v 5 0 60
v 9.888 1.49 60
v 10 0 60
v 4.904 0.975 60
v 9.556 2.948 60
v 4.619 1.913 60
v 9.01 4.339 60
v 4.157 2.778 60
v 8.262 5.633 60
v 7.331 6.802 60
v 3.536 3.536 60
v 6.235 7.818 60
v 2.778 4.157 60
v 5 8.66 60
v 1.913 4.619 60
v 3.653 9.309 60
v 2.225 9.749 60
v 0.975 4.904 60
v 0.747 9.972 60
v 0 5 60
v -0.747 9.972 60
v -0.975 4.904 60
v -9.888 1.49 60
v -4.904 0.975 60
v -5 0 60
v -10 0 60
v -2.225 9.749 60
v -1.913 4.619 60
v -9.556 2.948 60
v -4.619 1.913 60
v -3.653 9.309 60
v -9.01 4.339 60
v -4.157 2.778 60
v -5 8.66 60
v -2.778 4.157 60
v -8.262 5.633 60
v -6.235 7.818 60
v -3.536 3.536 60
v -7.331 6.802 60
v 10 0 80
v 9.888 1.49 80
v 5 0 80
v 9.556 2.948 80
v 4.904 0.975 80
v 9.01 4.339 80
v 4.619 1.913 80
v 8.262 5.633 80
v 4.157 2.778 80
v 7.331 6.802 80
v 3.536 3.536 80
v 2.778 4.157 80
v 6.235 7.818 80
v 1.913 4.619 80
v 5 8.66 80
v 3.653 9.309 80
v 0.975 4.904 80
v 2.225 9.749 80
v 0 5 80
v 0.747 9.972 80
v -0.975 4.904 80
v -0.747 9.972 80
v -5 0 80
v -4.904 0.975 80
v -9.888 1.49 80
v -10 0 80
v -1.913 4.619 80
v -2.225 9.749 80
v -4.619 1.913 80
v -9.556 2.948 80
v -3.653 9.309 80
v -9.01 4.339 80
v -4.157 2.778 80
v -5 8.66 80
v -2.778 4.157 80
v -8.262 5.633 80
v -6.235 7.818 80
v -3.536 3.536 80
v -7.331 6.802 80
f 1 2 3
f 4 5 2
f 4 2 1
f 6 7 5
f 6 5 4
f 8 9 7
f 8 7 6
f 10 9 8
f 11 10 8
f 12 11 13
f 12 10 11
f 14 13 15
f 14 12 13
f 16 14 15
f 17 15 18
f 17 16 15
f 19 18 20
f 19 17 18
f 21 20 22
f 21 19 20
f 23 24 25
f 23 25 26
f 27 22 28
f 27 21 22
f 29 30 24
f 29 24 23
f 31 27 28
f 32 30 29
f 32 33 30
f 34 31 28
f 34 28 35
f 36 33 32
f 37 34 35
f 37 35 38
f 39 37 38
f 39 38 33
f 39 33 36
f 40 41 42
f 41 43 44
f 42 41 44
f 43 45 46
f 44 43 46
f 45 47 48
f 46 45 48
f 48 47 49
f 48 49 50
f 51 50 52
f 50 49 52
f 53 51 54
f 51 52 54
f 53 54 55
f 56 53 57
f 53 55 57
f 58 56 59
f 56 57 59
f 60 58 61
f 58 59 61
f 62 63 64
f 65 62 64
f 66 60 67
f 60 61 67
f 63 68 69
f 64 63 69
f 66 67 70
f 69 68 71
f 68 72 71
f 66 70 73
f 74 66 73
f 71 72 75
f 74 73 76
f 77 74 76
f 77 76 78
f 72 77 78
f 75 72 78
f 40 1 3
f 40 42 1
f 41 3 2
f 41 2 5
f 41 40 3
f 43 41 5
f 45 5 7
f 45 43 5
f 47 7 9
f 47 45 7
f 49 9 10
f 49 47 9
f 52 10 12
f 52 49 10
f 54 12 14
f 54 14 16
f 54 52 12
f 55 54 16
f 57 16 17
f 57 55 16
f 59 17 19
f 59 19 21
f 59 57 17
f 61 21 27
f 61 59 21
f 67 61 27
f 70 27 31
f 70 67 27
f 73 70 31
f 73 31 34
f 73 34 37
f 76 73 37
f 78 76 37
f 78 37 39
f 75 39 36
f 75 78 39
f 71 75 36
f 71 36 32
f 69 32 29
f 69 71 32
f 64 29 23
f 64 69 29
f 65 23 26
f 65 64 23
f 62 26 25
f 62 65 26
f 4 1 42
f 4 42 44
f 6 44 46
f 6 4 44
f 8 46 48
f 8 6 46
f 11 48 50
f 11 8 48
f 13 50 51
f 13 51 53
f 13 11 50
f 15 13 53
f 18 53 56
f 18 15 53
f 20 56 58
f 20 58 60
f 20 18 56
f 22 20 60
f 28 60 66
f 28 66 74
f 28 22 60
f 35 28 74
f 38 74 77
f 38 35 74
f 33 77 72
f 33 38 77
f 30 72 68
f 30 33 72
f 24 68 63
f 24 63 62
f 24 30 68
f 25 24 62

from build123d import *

# Parameters (mm, degrees)
CYLINDER003_R     = 5
CYLINDER003_DEPTH = 20
CYLINDER002_W     = 10
CYLINDER002_H     = 20
CYLINDER002_ANGLE = 180


with BuildPart() as cylinder003:
    # Cylinder003 → Cylinder003 (new body)
    with BuildSketch(Plane.XY):
        Circle(CYLINDER003_R)
    extrude(amount=CYLINDER003_DEPTH)


with BuildPart() as cut:
    # Cylinder002 → Cylinder002 (revolve)
    with BuildSketch(Plane.XZ):
        with Locations((5, 10)):
            Rectangle(CYLINDER002_W, CYLINDER002_H)
    revolve(axis=Axis((0, 0, 0), (0, 0, 1)), revolution_arc=CYLINDER002_ANGLE)

    # Cut: cut Cylinder003
    add(cylinder003.part, mode=Mode.SUBTRACT)


with BuildPart() as cut_1:
    # Cut placement: moved
    add(cut.part.moved(Location((0, 0, 60))))


solid = cut_1.part
